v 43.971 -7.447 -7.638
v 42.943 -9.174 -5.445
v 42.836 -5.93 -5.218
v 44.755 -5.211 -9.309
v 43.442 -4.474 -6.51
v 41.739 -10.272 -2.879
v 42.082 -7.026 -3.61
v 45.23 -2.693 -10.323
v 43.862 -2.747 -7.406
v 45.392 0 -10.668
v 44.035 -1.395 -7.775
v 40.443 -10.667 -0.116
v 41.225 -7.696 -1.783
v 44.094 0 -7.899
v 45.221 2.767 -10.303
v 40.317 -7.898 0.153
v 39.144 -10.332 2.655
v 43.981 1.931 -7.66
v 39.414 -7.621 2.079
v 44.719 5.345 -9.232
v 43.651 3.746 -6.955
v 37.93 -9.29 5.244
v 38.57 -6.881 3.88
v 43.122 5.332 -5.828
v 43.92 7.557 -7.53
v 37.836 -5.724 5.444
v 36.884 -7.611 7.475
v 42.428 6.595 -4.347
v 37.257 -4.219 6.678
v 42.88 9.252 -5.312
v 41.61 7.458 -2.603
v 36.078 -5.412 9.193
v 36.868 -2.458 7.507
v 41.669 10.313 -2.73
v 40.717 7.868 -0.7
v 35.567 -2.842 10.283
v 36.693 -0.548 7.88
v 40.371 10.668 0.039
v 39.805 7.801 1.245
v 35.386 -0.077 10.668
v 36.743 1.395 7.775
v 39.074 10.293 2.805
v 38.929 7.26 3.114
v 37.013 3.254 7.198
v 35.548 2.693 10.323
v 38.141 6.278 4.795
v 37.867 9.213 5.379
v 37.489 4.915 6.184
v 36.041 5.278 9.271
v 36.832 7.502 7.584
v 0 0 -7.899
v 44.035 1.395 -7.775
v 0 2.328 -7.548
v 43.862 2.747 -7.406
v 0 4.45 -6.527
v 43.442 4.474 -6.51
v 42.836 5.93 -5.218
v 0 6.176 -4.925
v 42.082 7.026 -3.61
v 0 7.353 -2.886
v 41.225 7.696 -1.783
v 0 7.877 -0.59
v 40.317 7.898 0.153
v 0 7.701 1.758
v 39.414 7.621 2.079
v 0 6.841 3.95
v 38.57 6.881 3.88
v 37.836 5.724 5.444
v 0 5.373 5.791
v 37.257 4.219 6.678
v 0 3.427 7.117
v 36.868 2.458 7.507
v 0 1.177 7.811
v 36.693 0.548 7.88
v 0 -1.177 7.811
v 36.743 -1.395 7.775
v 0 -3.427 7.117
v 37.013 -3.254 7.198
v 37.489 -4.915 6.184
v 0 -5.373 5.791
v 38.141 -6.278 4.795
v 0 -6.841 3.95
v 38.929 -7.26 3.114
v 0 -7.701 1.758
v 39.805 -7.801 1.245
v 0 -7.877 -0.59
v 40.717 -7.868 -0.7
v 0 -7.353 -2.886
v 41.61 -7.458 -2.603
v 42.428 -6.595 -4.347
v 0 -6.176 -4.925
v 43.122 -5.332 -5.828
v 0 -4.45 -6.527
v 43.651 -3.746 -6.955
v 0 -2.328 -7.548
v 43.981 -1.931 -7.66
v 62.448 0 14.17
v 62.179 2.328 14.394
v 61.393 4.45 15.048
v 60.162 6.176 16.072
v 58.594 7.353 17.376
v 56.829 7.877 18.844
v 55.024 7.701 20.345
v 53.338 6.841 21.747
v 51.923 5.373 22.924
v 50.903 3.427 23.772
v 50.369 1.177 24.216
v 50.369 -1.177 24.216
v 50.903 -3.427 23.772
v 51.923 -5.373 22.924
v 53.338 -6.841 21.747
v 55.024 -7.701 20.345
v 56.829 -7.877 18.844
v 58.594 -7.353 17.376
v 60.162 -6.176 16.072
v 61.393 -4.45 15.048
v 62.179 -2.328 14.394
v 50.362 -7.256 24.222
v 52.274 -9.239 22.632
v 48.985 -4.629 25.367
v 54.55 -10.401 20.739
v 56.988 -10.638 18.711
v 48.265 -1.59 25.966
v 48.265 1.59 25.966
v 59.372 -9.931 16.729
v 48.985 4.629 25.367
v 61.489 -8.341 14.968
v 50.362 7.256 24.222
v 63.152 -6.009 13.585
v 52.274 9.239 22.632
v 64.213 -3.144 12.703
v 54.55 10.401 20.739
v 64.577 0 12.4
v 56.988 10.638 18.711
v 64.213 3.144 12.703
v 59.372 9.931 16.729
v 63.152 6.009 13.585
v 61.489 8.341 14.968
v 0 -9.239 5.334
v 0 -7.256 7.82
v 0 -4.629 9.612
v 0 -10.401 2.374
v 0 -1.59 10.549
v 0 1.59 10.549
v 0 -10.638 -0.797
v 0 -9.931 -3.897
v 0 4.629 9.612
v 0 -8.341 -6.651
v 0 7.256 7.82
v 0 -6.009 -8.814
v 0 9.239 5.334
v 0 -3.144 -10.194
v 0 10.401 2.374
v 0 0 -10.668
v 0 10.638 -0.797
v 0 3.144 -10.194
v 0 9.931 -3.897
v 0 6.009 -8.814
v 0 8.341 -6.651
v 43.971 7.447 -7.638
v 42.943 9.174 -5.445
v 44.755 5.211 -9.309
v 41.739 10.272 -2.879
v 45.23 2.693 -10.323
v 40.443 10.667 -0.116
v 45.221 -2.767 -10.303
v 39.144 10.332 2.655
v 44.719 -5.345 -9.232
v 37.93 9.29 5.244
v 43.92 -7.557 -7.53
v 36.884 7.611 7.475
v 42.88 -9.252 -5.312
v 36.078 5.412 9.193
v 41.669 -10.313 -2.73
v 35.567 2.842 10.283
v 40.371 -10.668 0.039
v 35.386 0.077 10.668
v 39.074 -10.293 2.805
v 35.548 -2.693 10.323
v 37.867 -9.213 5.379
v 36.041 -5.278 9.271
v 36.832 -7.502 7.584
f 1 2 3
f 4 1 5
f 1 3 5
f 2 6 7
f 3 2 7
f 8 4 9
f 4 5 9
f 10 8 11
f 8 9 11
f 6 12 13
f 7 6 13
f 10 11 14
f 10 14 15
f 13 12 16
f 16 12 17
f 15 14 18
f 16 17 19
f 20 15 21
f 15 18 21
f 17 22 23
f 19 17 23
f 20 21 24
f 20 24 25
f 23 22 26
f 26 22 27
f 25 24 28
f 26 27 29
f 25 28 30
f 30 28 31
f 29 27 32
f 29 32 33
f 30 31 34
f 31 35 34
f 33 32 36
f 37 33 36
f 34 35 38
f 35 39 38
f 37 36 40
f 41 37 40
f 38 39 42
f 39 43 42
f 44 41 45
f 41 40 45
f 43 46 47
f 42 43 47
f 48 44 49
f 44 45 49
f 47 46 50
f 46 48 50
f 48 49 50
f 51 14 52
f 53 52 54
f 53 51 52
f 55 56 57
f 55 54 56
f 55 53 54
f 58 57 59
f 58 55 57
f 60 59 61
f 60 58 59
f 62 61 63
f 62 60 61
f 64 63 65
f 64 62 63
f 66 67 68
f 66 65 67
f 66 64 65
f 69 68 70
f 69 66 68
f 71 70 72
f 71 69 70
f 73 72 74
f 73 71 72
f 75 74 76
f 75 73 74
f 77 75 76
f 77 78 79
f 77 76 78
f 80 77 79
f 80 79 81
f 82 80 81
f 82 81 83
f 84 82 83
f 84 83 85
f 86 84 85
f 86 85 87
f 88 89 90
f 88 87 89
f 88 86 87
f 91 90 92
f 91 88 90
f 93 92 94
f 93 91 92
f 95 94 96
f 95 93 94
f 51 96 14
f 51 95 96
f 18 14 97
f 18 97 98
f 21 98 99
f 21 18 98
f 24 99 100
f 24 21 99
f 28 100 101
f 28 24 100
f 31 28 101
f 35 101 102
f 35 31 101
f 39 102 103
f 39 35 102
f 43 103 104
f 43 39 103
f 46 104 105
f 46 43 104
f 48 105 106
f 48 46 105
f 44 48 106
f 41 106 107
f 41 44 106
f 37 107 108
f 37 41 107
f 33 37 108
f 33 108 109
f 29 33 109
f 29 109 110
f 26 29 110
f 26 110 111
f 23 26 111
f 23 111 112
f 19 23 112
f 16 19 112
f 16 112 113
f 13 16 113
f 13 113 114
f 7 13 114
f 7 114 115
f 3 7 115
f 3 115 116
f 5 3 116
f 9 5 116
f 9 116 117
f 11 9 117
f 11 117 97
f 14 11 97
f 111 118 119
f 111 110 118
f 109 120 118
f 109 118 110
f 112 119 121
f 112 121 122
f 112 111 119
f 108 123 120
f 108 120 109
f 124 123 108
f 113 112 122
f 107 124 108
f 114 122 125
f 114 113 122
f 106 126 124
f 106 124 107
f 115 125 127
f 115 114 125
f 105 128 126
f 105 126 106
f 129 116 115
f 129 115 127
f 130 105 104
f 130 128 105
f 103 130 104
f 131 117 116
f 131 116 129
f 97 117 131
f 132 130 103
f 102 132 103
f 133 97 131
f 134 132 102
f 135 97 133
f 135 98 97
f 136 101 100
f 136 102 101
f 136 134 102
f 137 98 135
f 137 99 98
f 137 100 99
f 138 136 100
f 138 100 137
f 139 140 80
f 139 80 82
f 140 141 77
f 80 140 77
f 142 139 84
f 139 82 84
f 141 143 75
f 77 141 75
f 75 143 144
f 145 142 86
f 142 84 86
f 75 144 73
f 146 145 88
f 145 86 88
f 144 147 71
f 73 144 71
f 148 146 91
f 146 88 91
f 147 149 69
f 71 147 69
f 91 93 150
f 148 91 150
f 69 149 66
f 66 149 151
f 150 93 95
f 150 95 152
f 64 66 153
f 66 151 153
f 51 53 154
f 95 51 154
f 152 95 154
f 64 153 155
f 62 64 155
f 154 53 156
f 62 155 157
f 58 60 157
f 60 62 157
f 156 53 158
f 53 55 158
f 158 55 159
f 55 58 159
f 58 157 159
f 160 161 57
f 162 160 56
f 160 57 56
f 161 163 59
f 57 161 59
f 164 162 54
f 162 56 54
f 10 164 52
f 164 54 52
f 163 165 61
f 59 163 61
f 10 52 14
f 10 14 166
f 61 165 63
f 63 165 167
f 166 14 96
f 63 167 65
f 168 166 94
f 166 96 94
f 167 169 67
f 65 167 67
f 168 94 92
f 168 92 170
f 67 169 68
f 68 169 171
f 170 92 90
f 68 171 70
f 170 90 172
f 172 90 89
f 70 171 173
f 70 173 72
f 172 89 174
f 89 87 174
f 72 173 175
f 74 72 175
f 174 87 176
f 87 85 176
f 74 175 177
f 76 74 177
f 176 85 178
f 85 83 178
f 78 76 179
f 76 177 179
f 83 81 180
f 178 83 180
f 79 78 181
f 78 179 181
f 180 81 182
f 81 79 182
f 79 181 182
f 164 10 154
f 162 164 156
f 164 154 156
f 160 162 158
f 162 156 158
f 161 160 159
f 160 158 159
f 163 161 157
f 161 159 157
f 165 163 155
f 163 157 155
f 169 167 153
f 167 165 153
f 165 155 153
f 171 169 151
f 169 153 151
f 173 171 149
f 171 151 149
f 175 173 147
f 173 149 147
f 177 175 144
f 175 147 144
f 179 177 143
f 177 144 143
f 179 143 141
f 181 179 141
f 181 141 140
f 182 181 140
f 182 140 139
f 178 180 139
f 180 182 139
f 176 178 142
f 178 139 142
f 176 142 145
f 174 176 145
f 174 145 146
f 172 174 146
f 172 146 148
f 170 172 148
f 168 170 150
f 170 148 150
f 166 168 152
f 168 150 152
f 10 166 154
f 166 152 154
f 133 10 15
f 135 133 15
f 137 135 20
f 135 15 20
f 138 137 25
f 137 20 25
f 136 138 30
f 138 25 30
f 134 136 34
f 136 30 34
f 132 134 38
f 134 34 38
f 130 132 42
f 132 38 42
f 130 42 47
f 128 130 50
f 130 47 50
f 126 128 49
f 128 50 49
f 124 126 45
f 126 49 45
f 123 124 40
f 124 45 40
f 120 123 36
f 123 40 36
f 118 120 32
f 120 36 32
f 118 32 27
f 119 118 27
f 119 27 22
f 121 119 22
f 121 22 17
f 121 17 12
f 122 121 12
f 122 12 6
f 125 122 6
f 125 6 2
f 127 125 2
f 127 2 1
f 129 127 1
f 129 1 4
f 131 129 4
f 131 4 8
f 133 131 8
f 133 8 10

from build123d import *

# Parameters (mm, degrees)
SKETCH11_R                = 10.668
SKETCH11_R_2              = 7.8994
PIPE_0_5_SCH_40_1_DEPTH   = 48.464216718
SKETCH11_ON_SEGMENT_2_R   = 10.668
SKETCH11_ON_SEGMENT_2_R_2 = 7.8994
PIPE_0_5_SCH_40_1_2_DEPTH = 33.075216718


with BuildPart() as part:
    # Sketch11 → Pipe 0.5 SCH 40(1) (new body)
    with BuildSketch(Plane(origin=(0, 0, 0), x_dir=(0, 0, -1), z_dir=(1, 0, 0))):
        Circle(SKETCH11_R)
        Circle(SKETCH11_R_2, mode=Mode.SUBTRACT)
    extrude(amount=PIPE_0_5_SCH_40_1_DEPTH)

    # Pipe 0.5 SCH 40(1) mitre 1
    split(bisect_by=Plane(origin=(40.389, 0, 0), x_dir=(0, -1, 0), z_dir=(-0.905383621, 0, -0.424594511)), keep=Keep.TOP)


with BuildPart() as body_2:
    # Sketch11 on segment 2 (carried to segment 2) → Pipe 0.5 SCH 40_1 2 (new body)
    with BuildSketch(Plane(origin=(35.225391481, 0, -6.208564416), x_dir=(0.768841832, 0, -0.639439002), z_dir=(0.639439002, 0, 0.768841832))):
        Circle(SKETCH11_ON_SEGMENT_2_R)
        Circle(SKETCH11_ON_SEGMENT_2_R_2, mode=Mode.SUBTRACT)
    extrude(amount=PIPE_0_5_SCH_40_1_2_DEPTH)

    # Pipe 0.5 SCH 40_1 2 mitre 1
    split(bisect_by=Plane(origin=(40.389, 0, 0), x_dir=(0, 1, 0), z_dir=(0.905383621, 0, 0.424594511)), keep=Keep.TOP)


solid = Compound([part.part, body_2.part])
